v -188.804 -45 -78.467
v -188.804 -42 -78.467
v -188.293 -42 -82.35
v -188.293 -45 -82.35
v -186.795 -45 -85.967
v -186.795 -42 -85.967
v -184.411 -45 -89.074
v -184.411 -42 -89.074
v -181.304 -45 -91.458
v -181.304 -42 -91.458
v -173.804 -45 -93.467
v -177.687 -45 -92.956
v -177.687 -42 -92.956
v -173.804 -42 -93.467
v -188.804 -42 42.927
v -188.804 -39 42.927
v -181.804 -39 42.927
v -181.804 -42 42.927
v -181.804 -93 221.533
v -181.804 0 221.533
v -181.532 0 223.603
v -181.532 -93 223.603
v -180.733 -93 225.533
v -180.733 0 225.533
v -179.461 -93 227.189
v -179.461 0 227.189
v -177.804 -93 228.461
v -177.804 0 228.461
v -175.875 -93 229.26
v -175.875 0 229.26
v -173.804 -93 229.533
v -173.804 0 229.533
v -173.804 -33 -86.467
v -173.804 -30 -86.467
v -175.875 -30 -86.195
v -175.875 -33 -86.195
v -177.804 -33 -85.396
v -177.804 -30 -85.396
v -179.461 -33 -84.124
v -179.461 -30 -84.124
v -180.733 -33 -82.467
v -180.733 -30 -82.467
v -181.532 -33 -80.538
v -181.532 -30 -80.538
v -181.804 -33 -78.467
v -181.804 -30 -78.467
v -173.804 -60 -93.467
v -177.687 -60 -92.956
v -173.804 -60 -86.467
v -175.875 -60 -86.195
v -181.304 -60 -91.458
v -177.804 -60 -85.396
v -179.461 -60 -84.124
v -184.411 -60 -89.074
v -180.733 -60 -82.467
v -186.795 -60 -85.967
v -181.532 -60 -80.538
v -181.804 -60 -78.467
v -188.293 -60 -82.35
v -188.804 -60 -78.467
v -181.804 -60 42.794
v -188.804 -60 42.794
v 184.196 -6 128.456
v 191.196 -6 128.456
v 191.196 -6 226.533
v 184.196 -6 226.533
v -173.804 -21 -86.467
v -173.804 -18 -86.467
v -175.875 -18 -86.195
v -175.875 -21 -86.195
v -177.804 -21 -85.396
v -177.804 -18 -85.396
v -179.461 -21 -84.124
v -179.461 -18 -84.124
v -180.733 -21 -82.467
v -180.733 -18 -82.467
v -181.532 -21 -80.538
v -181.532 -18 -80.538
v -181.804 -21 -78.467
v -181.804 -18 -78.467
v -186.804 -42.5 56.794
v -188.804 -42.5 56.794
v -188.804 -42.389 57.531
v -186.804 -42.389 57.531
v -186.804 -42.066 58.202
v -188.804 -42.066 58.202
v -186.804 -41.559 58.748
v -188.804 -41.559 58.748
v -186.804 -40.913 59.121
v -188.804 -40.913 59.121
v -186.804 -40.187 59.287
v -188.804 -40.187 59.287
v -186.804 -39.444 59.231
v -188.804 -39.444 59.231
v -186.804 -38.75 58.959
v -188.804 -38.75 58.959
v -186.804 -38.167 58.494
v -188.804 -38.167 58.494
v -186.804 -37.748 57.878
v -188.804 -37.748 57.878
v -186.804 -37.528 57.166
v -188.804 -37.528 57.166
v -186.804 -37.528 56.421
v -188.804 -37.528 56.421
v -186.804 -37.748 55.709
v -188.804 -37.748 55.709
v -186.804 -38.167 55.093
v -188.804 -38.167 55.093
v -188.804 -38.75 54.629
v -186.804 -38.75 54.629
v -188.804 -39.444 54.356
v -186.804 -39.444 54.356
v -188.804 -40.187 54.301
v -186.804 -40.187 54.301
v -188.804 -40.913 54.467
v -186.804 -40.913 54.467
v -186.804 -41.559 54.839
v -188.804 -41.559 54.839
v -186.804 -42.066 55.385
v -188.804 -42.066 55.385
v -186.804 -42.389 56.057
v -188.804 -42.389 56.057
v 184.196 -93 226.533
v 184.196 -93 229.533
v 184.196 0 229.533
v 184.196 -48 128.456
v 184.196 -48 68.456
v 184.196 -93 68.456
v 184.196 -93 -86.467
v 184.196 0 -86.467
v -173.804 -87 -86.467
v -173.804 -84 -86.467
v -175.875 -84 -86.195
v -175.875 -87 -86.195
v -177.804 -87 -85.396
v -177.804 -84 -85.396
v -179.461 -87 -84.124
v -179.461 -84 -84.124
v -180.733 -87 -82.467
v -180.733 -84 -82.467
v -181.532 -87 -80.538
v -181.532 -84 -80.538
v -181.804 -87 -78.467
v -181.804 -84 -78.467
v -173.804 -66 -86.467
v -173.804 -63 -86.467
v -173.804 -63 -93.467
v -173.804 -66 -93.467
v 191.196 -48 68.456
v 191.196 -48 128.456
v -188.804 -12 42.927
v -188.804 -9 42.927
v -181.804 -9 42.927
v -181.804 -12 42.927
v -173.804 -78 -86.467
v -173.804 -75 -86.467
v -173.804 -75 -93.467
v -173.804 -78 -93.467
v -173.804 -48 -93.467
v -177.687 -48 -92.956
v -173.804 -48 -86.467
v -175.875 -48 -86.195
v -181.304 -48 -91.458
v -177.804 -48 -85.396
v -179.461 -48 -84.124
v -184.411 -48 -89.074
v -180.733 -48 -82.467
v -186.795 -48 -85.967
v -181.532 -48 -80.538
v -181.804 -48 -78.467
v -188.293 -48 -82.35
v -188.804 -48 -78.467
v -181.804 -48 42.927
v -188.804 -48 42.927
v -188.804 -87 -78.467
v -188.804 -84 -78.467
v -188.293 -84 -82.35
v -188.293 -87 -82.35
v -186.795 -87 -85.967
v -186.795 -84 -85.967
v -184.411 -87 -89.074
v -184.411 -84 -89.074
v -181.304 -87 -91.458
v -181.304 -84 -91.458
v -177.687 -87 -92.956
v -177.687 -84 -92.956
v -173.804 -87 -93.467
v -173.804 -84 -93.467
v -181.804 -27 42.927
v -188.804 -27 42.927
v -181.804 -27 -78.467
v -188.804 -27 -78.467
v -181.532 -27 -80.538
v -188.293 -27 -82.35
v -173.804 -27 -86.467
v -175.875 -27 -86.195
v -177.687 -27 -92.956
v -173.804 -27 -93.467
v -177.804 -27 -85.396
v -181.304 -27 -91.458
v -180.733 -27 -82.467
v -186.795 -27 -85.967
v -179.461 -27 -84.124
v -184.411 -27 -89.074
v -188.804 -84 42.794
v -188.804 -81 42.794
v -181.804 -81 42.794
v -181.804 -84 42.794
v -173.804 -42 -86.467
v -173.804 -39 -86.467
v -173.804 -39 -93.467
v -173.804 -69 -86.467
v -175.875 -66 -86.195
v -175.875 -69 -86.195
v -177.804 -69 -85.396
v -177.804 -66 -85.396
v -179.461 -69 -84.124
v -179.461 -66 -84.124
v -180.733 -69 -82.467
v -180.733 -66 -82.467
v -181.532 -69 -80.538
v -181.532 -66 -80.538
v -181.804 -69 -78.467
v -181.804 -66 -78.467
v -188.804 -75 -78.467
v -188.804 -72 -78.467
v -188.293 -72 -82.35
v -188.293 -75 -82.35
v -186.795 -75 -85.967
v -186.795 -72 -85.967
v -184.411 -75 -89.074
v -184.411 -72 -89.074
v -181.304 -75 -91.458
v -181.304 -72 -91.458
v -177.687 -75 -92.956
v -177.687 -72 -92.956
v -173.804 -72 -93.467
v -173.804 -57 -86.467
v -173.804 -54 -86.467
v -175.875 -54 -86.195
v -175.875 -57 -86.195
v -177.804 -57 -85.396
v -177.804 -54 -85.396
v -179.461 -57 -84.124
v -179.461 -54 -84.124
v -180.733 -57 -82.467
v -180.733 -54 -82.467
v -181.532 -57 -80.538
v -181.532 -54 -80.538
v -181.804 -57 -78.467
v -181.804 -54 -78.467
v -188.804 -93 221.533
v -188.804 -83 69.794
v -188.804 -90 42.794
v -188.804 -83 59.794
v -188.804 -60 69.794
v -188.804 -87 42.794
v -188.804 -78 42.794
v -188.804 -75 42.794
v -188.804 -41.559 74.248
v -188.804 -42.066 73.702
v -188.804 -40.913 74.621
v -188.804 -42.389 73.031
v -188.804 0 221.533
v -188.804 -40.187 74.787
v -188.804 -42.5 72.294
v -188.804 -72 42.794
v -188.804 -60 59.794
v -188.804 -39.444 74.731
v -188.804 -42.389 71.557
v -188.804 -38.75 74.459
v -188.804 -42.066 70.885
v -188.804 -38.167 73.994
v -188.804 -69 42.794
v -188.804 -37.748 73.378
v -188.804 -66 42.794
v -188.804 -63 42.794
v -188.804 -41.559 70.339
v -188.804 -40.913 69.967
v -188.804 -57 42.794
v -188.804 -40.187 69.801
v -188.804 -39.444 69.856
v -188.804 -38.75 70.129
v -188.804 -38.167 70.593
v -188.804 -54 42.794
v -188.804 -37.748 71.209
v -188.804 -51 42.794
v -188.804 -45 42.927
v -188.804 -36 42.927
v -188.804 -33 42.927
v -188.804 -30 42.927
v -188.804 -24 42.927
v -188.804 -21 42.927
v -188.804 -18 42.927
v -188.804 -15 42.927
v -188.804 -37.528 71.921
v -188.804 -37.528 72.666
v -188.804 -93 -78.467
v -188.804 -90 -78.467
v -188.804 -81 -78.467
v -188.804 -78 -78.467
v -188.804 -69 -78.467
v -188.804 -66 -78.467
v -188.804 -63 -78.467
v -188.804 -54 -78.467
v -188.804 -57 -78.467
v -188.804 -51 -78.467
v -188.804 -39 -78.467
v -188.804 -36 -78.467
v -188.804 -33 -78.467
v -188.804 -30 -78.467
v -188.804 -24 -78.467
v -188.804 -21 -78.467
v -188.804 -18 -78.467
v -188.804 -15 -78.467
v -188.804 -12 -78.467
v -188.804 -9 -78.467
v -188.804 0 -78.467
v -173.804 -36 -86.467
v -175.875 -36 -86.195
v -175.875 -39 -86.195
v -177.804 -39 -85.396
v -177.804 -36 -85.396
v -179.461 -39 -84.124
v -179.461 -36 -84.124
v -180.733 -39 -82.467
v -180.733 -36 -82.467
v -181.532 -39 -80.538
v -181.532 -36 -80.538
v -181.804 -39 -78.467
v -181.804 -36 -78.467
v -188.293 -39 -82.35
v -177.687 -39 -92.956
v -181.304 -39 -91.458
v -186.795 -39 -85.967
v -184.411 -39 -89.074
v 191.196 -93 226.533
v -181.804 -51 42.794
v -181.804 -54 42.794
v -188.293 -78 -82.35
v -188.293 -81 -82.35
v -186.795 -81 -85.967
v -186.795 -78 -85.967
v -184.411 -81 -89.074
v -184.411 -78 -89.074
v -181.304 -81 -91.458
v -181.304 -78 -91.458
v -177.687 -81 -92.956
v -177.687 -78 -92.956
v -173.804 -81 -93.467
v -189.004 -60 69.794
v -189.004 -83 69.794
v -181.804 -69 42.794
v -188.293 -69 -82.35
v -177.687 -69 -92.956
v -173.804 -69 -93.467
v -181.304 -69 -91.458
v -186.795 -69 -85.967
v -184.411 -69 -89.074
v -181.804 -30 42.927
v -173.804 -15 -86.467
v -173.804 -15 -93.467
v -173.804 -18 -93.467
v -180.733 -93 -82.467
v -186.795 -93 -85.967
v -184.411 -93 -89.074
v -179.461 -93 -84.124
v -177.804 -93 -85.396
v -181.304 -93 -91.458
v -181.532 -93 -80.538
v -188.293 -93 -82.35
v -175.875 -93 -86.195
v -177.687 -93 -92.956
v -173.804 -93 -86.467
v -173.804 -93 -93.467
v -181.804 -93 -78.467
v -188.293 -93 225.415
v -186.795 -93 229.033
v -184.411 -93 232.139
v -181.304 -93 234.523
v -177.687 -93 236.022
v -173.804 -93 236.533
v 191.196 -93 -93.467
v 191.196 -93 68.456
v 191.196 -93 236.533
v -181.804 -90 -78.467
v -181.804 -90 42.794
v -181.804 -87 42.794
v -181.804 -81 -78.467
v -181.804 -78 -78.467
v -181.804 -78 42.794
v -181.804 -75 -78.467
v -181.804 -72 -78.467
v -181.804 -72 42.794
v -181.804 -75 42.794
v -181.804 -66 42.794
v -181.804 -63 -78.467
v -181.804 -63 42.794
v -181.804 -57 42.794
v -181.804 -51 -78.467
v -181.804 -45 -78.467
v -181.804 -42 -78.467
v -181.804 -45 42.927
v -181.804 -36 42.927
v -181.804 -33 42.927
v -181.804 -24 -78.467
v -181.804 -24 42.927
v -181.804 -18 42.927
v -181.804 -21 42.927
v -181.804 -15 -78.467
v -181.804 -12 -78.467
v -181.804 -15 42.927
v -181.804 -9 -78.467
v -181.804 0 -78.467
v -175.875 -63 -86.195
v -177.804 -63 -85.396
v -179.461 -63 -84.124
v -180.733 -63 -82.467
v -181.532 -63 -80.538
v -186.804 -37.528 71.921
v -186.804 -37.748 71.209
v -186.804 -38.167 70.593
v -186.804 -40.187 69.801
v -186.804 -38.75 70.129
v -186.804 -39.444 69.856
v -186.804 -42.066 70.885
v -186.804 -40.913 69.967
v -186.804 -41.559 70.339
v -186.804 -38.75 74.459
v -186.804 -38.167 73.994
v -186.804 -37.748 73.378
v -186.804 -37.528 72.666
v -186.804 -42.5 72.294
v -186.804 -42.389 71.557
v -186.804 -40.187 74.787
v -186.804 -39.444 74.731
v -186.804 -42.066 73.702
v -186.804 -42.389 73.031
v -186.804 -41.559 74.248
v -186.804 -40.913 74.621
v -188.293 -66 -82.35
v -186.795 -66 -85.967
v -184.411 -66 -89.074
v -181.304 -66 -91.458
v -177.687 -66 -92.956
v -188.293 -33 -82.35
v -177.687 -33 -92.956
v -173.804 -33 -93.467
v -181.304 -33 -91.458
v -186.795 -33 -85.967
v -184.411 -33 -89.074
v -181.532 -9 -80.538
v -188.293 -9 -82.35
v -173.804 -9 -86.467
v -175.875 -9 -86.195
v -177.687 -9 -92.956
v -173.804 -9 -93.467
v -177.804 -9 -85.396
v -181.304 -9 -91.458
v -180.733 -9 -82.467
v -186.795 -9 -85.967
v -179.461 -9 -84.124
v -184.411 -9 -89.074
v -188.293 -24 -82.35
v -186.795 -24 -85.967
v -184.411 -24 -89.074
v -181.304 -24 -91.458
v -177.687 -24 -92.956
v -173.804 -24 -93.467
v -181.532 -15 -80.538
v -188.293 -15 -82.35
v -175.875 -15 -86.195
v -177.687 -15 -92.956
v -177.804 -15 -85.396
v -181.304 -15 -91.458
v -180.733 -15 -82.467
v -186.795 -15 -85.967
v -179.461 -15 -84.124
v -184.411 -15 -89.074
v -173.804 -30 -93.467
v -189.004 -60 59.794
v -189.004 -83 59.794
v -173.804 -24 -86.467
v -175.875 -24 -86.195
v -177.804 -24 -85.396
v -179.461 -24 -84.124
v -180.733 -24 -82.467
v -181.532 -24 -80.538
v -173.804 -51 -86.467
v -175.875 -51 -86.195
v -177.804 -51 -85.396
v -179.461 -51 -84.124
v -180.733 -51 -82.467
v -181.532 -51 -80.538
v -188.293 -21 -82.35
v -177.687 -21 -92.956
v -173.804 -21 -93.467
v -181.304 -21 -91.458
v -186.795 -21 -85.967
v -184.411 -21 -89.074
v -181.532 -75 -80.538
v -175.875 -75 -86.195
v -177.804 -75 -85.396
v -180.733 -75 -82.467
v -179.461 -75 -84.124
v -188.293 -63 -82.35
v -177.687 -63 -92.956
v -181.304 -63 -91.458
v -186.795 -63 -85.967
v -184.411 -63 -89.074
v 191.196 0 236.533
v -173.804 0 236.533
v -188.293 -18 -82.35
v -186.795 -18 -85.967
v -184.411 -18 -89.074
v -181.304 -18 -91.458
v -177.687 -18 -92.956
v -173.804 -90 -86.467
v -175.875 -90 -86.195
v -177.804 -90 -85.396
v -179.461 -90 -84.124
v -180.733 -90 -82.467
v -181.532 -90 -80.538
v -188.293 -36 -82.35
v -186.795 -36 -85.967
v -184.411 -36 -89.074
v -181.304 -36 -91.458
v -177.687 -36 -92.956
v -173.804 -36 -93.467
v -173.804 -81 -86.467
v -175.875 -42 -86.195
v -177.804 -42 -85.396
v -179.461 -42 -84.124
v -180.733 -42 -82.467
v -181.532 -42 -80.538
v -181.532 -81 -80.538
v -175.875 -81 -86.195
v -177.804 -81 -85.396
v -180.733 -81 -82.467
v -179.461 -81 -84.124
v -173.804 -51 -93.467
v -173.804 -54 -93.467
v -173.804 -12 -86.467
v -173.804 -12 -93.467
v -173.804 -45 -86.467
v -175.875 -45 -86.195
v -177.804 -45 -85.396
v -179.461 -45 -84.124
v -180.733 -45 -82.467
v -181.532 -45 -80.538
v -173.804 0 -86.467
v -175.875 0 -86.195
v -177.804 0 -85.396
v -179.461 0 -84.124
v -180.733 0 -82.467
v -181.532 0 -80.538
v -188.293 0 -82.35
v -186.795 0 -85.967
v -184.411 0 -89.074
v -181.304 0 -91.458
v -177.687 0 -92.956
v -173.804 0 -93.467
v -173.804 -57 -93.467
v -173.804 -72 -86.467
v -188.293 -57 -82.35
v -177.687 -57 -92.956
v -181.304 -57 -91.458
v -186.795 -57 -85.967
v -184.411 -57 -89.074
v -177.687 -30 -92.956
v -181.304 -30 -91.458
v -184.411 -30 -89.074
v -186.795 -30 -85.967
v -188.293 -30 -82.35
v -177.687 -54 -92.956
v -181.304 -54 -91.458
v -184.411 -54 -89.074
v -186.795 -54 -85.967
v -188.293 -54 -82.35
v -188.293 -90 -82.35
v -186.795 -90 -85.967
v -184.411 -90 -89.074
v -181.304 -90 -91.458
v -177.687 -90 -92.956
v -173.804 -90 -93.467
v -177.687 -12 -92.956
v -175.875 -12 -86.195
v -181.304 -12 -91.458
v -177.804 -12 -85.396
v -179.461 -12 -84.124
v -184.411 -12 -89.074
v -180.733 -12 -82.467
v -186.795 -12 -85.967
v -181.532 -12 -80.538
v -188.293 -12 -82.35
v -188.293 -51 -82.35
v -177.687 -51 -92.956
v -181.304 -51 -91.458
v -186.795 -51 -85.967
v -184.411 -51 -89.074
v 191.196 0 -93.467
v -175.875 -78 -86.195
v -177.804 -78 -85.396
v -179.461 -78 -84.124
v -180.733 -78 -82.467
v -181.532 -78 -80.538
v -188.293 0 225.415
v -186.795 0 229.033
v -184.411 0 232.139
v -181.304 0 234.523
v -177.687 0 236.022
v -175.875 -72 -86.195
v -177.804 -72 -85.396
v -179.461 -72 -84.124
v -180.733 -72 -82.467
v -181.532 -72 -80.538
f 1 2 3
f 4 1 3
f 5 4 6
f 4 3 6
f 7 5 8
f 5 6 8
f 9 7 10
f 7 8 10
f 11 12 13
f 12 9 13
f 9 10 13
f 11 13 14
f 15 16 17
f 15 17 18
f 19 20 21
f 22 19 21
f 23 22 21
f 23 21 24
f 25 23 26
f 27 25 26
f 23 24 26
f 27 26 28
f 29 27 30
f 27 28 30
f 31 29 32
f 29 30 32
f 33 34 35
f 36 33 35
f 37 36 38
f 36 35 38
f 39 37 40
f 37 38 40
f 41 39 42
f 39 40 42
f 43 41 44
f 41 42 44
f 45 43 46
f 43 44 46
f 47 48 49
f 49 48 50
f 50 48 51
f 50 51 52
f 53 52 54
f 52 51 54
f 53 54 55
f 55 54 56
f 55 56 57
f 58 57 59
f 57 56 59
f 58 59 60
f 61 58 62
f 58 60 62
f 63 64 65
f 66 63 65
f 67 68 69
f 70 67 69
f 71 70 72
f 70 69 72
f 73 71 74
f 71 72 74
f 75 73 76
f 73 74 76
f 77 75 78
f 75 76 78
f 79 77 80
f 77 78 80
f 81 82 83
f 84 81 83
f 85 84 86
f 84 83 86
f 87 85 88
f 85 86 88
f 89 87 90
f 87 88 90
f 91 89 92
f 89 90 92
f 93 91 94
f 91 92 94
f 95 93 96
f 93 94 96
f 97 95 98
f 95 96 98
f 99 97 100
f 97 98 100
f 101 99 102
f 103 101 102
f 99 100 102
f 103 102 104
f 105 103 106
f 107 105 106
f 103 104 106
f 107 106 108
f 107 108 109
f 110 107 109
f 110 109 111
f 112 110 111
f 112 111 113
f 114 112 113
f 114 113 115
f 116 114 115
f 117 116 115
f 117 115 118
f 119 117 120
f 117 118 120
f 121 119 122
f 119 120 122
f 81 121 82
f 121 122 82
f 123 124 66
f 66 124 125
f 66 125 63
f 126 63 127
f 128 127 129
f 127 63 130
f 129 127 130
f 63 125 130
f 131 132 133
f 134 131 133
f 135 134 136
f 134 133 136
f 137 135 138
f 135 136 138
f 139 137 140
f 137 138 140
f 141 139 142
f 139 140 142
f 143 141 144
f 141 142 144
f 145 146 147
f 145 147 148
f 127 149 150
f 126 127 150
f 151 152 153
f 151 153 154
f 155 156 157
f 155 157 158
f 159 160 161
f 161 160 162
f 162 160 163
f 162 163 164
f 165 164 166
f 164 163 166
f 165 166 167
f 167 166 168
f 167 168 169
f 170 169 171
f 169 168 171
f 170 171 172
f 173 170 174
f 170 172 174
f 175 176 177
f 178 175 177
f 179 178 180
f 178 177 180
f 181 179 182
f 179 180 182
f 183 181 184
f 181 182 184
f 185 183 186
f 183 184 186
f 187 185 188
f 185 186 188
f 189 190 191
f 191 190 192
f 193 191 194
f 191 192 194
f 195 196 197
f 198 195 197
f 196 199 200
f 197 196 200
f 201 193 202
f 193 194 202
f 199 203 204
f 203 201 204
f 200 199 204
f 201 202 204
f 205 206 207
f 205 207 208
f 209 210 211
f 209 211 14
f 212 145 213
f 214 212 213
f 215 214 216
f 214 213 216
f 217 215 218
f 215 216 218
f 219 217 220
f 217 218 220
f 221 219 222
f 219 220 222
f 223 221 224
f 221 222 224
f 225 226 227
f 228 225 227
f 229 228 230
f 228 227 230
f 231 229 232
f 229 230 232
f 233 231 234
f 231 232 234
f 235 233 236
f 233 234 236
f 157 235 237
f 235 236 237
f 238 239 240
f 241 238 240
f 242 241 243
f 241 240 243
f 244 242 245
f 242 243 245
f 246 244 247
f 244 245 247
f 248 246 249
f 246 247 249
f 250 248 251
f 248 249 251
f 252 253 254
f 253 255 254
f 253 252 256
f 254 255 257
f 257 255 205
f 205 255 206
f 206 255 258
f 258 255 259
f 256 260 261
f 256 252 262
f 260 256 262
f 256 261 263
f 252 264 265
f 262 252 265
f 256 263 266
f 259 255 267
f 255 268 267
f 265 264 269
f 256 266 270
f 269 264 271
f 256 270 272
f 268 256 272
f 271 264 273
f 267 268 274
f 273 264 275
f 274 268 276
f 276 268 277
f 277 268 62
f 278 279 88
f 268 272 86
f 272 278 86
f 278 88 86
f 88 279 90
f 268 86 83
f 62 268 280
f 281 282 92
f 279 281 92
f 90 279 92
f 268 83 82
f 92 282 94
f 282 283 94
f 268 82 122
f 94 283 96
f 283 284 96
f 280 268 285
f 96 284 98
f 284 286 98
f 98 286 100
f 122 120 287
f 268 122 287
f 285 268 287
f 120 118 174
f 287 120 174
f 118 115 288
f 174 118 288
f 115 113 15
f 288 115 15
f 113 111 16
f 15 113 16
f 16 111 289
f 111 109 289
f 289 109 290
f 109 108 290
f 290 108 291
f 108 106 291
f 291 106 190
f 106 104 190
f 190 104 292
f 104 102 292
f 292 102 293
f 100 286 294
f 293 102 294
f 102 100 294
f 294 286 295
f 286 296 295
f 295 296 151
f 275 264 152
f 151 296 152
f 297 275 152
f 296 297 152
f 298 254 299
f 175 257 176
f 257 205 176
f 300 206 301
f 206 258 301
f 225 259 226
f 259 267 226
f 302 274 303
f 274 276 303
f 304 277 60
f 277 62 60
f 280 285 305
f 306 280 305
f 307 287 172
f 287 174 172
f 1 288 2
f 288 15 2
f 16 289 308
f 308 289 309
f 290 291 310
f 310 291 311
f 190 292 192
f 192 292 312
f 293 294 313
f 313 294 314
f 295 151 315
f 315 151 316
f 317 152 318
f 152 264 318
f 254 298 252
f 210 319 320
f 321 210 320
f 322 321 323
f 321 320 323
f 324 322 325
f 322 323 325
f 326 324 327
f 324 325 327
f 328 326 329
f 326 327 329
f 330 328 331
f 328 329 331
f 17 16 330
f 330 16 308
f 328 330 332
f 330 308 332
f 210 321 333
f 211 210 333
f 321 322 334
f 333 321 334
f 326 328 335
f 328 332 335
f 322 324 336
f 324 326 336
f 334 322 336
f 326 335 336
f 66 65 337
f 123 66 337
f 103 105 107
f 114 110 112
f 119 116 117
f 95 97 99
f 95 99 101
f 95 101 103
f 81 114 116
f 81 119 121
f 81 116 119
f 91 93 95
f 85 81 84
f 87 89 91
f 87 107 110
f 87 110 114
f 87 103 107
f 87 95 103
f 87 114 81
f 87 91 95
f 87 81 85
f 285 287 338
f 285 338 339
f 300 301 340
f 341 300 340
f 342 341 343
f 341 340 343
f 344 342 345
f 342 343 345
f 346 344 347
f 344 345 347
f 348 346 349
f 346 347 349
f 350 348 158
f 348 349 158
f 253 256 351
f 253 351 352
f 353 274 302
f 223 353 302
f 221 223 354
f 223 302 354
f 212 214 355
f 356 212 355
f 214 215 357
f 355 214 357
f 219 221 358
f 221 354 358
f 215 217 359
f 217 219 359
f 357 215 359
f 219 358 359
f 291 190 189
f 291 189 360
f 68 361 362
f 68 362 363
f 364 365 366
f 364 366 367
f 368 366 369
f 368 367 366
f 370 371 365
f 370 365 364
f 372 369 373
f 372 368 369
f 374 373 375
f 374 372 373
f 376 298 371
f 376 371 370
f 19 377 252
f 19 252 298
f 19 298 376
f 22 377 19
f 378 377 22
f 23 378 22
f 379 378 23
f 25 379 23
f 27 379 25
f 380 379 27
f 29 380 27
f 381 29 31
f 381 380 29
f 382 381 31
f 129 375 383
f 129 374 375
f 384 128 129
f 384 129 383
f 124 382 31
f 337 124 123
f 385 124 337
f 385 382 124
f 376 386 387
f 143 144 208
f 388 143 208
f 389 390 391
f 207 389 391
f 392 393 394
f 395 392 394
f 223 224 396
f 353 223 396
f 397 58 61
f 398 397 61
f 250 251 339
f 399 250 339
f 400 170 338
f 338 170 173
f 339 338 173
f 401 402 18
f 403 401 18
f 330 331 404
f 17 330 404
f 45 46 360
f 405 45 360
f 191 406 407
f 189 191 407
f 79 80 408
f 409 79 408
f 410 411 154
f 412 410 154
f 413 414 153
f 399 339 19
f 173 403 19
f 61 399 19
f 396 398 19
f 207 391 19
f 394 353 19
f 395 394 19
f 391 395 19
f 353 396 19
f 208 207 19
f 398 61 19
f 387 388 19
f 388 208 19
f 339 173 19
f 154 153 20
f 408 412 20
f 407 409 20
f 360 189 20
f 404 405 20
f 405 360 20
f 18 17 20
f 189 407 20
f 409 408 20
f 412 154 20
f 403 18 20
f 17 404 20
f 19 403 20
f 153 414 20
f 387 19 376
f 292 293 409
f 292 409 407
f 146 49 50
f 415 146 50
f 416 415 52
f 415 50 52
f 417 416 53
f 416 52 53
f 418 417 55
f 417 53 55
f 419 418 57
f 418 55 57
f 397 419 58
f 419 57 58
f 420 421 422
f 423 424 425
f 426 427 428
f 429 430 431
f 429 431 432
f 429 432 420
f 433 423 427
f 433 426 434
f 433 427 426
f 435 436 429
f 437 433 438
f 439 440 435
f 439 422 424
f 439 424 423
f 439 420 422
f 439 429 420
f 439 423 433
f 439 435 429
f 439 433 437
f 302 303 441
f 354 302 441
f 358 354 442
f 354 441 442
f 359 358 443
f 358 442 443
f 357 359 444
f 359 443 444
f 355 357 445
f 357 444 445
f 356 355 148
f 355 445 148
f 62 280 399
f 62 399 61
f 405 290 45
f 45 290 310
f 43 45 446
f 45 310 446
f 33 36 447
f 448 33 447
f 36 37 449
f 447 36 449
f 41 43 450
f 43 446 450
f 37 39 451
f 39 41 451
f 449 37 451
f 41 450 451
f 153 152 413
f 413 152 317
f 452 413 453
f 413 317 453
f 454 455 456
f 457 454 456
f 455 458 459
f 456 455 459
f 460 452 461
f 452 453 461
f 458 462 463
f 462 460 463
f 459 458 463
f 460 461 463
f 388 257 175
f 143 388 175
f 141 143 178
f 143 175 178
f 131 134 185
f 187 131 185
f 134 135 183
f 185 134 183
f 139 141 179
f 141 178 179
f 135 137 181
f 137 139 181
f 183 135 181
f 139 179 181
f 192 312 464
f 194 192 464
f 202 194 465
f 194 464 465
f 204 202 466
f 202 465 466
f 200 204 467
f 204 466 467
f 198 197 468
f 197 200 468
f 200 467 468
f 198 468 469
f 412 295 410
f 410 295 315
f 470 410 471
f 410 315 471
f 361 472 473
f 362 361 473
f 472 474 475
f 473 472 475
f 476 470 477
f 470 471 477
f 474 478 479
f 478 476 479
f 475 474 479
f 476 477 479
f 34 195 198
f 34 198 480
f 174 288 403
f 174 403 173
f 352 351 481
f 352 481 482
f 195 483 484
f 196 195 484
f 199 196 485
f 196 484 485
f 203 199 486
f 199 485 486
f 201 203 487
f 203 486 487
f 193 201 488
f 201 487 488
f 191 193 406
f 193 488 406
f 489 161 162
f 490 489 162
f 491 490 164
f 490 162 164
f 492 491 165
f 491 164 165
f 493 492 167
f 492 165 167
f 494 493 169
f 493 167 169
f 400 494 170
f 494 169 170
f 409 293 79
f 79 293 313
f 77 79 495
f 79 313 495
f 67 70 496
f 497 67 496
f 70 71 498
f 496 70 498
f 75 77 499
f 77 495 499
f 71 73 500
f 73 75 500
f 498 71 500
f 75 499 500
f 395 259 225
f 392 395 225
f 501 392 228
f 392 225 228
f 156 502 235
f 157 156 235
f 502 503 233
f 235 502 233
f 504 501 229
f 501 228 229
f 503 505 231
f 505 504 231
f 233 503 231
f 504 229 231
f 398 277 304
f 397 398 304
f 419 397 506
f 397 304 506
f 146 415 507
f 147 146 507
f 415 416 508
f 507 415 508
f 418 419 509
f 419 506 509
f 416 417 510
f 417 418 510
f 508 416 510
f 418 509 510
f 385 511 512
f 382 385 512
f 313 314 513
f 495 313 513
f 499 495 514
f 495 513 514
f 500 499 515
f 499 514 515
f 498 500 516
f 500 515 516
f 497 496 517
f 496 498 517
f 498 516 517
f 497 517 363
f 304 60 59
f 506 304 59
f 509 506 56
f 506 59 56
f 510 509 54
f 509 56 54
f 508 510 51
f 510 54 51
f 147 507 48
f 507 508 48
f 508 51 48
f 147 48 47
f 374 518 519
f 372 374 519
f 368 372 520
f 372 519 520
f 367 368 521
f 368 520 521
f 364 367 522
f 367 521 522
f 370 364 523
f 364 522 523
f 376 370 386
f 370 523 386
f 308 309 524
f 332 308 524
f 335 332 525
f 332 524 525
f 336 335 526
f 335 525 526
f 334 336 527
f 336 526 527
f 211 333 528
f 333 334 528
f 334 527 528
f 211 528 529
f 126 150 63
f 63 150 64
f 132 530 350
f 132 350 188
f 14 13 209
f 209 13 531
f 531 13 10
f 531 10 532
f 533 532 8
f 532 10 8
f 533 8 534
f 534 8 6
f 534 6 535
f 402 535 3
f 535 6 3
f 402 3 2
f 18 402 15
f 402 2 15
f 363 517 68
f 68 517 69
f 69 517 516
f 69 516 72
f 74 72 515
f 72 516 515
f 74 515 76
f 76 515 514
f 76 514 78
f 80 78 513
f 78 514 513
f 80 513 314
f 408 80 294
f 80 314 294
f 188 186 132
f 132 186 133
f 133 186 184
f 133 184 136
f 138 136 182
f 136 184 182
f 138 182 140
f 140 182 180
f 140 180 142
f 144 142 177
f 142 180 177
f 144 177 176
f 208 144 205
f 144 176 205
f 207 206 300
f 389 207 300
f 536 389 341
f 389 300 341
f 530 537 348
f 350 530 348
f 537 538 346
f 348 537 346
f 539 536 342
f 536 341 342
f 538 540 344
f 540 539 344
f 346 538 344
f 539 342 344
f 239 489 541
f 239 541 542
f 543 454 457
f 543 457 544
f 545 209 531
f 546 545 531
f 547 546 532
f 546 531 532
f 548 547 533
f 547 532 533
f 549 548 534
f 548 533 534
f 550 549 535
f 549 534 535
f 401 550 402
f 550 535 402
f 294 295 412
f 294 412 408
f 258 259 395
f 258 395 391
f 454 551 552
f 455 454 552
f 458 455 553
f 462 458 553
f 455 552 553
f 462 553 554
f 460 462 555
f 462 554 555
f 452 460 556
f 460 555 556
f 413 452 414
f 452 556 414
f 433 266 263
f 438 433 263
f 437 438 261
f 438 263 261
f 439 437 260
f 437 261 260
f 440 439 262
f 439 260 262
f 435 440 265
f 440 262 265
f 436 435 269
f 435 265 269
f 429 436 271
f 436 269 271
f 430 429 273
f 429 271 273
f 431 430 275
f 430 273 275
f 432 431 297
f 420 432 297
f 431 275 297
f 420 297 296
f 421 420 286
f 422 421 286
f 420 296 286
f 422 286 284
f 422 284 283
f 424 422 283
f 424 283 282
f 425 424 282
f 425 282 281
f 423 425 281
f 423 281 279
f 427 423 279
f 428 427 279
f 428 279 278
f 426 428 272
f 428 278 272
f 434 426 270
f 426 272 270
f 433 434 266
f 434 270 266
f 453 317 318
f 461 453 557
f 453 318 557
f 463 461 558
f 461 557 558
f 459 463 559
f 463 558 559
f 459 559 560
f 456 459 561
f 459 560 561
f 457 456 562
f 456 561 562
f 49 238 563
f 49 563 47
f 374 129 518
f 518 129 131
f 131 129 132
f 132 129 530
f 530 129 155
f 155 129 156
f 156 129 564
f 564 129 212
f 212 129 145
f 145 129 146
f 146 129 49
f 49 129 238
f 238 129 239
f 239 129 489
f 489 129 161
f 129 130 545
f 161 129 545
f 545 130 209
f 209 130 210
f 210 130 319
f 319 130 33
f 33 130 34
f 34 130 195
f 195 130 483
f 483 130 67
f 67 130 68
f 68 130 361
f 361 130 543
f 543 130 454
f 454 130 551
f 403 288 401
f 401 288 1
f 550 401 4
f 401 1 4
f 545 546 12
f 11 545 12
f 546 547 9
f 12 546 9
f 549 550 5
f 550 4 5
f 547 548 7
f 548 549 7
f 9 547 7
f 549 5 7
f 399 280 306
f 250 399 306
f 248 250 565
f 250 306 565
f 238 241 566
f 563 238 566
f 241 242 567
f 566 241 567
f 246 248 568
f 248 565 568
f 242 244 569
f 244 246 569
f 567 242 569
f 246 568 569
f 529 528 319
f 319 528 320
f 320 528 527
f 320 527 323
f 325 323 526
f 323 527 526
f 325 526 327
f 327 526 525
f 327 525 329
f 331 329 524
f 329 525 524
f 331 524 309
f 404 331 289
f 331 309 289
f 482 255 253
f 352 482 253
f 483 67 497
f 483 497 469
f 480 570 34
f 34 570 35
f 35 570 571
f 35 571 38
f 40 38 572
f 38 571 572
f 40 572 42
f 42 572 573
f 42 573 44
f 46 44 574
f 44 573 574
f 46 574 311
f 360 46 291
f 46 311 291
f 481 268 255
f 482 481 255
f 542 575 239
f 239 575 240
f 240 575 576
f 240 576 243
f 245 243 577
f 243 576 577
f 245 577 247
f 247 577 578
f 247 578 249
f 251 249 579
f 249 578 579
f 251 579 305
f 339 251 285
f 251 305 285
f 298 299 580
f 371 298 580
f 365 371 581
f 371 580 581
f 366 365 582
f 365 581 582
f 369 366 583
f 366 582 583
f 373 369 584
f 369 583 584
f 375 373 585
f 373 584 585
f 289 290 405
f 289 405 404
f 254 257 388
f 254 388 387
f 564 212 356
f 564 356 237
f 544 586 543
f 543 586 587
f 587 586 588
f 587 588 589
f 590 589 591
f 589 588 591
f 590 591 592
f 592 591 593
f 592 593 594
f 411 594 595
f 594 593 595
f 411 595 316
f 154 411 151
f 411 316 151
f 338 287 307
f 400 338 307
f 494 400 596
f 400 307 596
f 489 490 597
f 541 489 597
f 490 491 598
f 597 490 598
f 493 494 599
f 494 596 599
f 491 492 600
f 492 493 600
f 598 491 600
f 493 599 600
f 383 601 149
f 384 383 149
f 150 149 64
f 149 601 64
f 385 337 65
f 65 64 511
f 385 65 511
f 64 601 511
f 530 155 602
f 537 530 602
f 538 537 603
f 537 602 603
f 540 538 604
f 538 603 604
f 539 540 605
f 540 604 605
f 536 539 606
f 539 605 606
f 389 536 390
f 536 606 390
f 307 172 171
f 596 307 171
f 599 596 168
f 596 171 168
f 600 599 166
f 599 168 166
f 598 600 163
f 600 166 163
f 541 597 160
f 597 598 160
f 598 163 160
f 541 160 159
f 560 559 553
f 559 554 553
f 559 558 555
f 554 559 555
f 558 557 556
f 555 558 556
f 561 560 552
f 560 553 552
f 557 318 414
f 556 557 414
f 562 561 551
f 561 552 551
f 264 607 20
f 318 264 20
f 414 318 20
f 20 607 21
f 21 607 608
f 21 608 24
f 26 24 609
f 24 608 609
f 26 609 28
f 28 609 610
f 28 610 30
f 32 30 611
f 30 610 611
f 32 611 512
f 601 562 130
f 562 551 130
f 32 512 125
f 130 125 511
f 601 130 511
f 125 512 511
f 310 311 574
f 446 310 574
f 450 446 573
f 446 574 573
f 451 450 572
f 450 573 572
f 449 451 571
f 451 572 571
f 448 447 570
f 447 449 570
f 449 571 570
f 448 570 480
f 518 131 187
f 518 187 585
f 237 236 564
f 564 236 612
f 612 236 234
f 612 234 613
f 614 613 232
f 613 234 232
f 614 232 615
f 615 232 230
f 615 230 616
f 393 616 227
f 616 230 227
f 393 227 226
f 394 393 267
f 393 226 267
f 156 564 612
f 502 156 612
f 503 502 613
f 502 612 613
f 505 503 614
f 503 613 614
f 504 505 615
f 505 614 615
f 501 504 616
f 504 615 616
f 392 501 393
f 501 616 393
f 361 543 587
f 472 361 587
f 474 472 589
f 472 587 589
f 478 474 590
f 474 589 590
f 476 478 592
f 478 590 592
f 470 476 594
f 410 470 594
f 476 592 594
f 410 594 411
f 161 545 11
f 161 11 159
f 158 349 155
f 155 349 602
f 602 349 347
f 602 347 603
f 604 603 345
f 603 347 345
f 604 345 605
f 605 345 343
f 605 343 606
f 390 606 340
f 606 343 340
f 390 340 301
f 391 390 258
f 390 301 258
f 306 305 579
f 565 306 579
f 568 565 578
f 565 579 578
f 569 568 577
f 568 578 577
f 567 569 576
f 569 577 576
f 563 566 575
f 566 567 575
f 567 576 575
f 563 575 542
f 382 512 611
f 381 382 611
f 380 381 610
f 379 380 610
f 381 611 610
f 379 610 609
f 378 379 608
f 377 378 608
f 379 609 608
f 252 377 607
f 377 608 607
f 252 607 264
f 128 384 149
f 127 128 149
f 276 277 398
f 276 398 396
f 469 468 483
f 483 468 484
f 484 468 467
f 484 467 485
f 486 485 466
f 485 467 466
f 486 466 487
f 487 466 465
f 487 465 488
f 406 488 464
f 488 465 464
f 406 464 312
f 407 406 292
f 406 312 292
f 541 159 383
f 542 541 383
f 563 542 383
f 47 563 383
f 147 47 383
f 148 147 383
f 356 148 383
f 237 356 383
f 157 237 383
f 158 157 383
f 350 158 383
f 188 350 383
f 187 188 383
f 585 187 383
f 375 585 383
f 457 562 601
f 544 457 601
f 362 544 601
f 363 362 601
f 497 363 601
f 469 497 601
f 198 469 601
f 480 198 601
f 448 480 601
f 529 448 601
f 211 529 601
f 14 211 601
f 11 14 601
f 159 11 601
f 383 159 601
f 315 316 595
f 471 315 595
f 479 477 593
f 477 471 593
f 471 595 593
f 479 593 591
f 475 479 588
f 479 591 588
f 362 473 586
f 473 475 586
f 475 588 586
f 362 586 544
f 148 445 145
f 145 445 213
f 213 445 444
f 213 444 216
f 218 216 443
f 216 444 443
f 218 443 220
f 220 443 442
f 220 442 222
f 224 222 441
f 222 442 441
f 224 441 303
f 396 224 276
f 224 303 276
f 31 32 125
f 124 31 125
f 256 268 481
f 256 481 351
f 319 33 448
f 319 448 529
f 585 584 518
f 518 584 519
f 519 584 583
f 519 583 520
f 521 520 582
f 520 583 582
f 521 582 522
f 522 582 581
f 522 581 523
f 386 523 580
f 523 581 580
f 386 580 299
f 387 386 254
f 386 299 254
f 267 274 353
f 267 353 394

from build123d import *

# Parameters (mm, degrees)
F1_DEPTH  = 93
F3_DEPTH  = 25
F4_W      = 3
F4_H      = 15.738895
F4_H_2    = 121.261105
F5_DEPTH  = 15
F6_DEPTH  = 15
F7_DEPTH  = 15
F8_DEPTH  = 15
F9_DEPTH  = 15
F10_DEPTH = 15
F11_DEPTH = 15
F4_H_3    = 121.394625
F12_DEPTH = 15
F13_DEPTH = 15
F14_DEPTH = 15
F15_DEPTH = 15
F16_DEPTH = 15
F17_DEPTH = 15
F18_DEPTH = 15
F19_DEPTH = 15
F20_W     = 23
F20_H     = 10
F21_DEPTH = 0.2
F22_R     = 2.5
F23_DEPTH = 2
F24_DEPTH = 2


with BuildPart() as f1:
    # F0 (on Front) → F1 (new body)
    with BuildSketch(Plane.XZ):
        with BuildLine():
            Line((191.195573, 236.532636), (-173.804427, 236.532636))
            ThreePointArc((-173.804427, 236.532636), (-184.411028, 232.139238), (-188.804427, 221.532636))
            Line((-188.804427, 221.532636), (-188.804427, -78.467364))
            ThreePointArc((-188.804427, -78.467364), (-184.411028, -89.073966), (-173.804427, -93.467364))
            Line((-173.804427, -93.467364), (191.195573, -93.467364))
            Line((191.195573, -93.467364), (191.195573, 236.532636))
        make_face()
        with BuildLine():
            ThreePointArc((-181.804427, 221.532636), (-179.461281, 227.18949), (-173.804427, 229.532636))
            Line((-173.804427, 229.532636), (184.195573, 229.532636))
            Line((184.195573, 229.532636), (184.195573, -86.467364))
            Line((184.195573, -86.467364), (-173.804427, -86.467364))
            ThreePointArc((-173.804427, -86.467364), (-179.461281, -84.124218), (-181.804427, -78.467364))
            Line((-181.804427, -78.467364), (-181.804427, 221.532636))
        make_face(mode=Mode.SUBTRACT)
    extrude(amount=F1_DEPTH)

    # F2 (on face) → F3 (cut)
    with BuildSketch(Plane.YZ.offset(191.195573)):
        Polygon((-6, 128.456), (-6, 226.532636), (-93, 226.532636), (-93, 68.456), (-48, 68.456), (-48, 128.456), align=None)
    extrude(amount=-F3_DEPTH, mode=Mode.SUBTRACT)

    # F4 (on face) → F5 (cut)
    with BuildSketch(Plane(origin=(-188.804427, 0, 0), x_dir=(0, -1, 0), z_dir=(-1, 0, 0))):
        with Locations((88.5, -86.336811)):
            Rectangle(F4_W, F4_H)
        with Locations((88.5, -17.836812)):
            Rectangle(F4_W, F4_H_2)
    extrude(amount=-F5_DEPTH, mode=Mode.SUBTRACT)

    # F4 (on face) → F6 (cut)
    with BuildSketch(Plane(origin=(-188.804427, 0, 0), x_dir=(0, -1, 0), z_dir=(-1, 0, 0))):
        with Locations((82.5, -17.836812)):
            Rectangle(F4_W, F4_H_2)
        with Locations((82.5, -86.336811)):
            Rectangle(F4_W, F4_H)
    extrude(amount=-F6_DEPTH, mode=Mode.SUBTRACT)

    # F4 (on face) → F7 (cut)
    with BuildSketch(Plane(origin=(-188.804427, 0, 0), x_dir=(0, -1, 0), z_dir=(-1, 0, 0))):
        with Locations((76.5, -17.836812)):
            Rectangle(F4_W, F4_H_2)
        with Locations((76.5, -86.336811)):
            Rectangle(F4_W, F4_H)
    extrude(amount=-F7_DEPTH, mode=Mode.SUBTRACT)

    # F4 (on face) → F8 (cut)
    with BuildSketch(Plane(origin=(-188.804427, 0, 0), x_dir=(0, -1, 0), z_dir=(-1, 0, 0))):
        with Locations((70.5, -17.836812)):
            Rectangle(F4_W, F4_H_2)
        with Locations((70.5, -86.336811)):
            Rectangle(F4_W, F4_H)
    extrude(amount=-F8_DEPTH, mode=Mode.SUBTRACT)

    # F4 (on face) → F9 (cut)
    with BuildSketch(Plane(origin=(-188.804427, 0, 0), x_dir=(0, -1, 0), z_dir=(-1, 0, 0))):
        with Locations((64.5, -17.836812)):
            Rectangle(F4_W, F4_H_2)
        with Locations((64.5, -86.336811)):
            Rectangle(F4_W, F4_H)
    extrude(amount=-F9_DEPTH, mode=Mode.SUBTRACT)

    # F4 (on face) → F10 (cut)
    with BuildSketch(Plane(origin=(-188.804427, 0, 0), x_dir=(0, -1, 0), z_dir=(-1, 0, 0))):
        with Locations((58.5, -86.336811)):
            Rectangle(F4_W, F4_H)
        with Locations((58.5, -17.836812)):
            Rectangle(F4_W, F4_H_2)
    extrude(amount=-F10_DEPTH, mode=Mode.SUBTRACT)

    # F4 (on face) → F11 (cut)
    with BuildSketch(Plane(origin=(-188.804427, 0, 0), x_dir=(0, -1, 0), z_dir=(-1, 0, 0))):
        with Locations((52.5, -17.836812)):
            Rectangle(F4_W, F4_H_2)
        with Locations((52.5, -86.336811)):
            Rectangle(F4_W, F4_H)
    extrude(amount=-F11_DEPTH, mode=Mode.SUBTRACT)

    # F4 (on face) → F12 (cut)
    with BuildSketch(Plane(origin=(-188.804427, 0, 0), x_dir=(0, -1, 0), z_dir=(-1, 0, 0))):
        with Locations((46.5, -86.336811)):
            Rectangle(F4_W, F4_H)
        with Locations((46.5, -17.770052)):
            Rectangle(F4_W, F4_H_3)
    extrude(amount=-F12_DEPTH, mode=Mode.SUBTRACT)

    # F4 (on face) → F13 (cut)
    with BuildSketch(Plane(origin=(-188.804427, 0, 0), x_dir=(0, -1, 0), z_dir=(-1, 0, 0))):
        with Locations((40.5, -17.770052)):
            Rectangle(F4_W, F4_H_3)
        with Locations((40.5, -86.336811)):
            Rectangle(F4_W, F4_H)
    extrude(amount=-F13_DEPTH, mode=Mode.SUBTRACT)

    # F4 (on face) → F14 (cut)
    with BuildSketch(Plane(origin=(-188.804427, 0, 0), x_dir=(0, -1, 0), z_dir=(-1, 0, 0))):
        with Locations((40.5, -17.770052)):
            Rectangle(F4_W, F4_H_3)
        with Locations((40.5, -86.336811)):
            Rectangle(F4_W, F4_H)
    extrude(amount=-F14_DEPTH, mode=Mode.SUBTRACT)

    # F4 (on face) → F15 (cut)
    with BuildSketch(Plane(origin=(-188.804427, 0, 0), x_dir=(0, -1, 0), z_dir=(-1, 0, 0))):
        with Locations((34.5, -17.770052)):
            Rectangle(F4_W, F4_H_3)
        with Locations((34.5, -86.336811)):
            Rectangle(F4_W, F4_H)
    extrude(amount=-F15_DEPTH, mode=Mode.SUBTRACT)

    # F4 (on face) → F16 (cut)
    with BuildSketch(Plane(origin=(-188.804427, 0, 0), x_dir=(0, -1, 0), z_dir=(-1, 0, 0))):
        with Locations((28.5, -17.770052)):
            Rectangle(F4_W, F4_H_3)
        with Locations((28.5, -86.336811)):
            Rectangle(F4_W, F4_H)
    extrude(amount=-F16_DEPTH, mode=Mode.SUBTRACT)

    # F4 (on face) → F17 (cut)
    with BuildSketch(Plane(origin=(-188.804427, 0, 0), x_dir=(0, -1, 0), z_dir=(-1, 0, 0))):
        with Locations((22.5, -17.770052)):
            Rectangle(F4_W, F4_H_3)
        with Locations((22.5, -86.336811)):
            Rectangle(F4_W, F4_H)
    extrude(amount=-F17_DEPTH, mode=Mode.SUBTRACT)

    # F4 (on face) → F18 (cut)
    with BuildSketch(Plane(origin=(-188.804427, 0, 0), x_dir=(0, -1, 0), z_dir=(-1, 0, 0))):
        with Locations((16.5, -17.770052)):
            Rectangle(F4_W, F4_H_3)
        with Locations((16.5, -86.336811)):
            Rectangle(F4_W, F4_H)
    extrude(amount=-F18_DEPTH, mode=Mode.SUBTRACT)

    # F4 (on face) → F19 (cut)
    with BuildSketch(Plane(origin=(-188.804427, 0, 0), x_dir=(0, -1, 0), z_dir=(-1, 0, 0))):
        with Locations((10.5, -17.770052)):
            Rectangle(F4_W, F4_H_3)
        with Locations((10.5, -86.336811)):
            Rectangle(F4_W, F4_H)
    extrude(amount=-F19_DEPTH, mode=Mode.SUBTRACT)

    # F20 (on face) → F21 (join)
    with BuildSketch(Plane(origin=(-188.804427, 0, 0), x_dir=(0, -1, 0), z_dir=(-1, 0, 0))):
        with Locations((71.5, 64.793741)):
            Rectangle(F20_W, F20_H)
    extrude(amount=F21_DEPTH)

    # F22 (on face) → F23 (cut)
    with BuildSketch(Plane(origin=(-188.804427, 0, 0), x_dir=(0, -1, 0), z_dir=(-1, 0, 0))):
        with Locations((40, 56.793741)):
            Circle(F22_R)
    extrude(amount=-F23_DEPTH, mode=Mode.SUBTRACT)

    # F22 (on face) → F24 (cut)
    with BuildSketch(Plane(origin=(-188.804427, 0, 0), x_dir=(0, -1, 0), z_dir=(-1, 0, 0))):
        with Locations((40, 72.293741)):
            Circle(F22_R)
    extrude(amount=-F24_DEPTH, mode=Mode.SUBTRACT)


solid = f1.part
